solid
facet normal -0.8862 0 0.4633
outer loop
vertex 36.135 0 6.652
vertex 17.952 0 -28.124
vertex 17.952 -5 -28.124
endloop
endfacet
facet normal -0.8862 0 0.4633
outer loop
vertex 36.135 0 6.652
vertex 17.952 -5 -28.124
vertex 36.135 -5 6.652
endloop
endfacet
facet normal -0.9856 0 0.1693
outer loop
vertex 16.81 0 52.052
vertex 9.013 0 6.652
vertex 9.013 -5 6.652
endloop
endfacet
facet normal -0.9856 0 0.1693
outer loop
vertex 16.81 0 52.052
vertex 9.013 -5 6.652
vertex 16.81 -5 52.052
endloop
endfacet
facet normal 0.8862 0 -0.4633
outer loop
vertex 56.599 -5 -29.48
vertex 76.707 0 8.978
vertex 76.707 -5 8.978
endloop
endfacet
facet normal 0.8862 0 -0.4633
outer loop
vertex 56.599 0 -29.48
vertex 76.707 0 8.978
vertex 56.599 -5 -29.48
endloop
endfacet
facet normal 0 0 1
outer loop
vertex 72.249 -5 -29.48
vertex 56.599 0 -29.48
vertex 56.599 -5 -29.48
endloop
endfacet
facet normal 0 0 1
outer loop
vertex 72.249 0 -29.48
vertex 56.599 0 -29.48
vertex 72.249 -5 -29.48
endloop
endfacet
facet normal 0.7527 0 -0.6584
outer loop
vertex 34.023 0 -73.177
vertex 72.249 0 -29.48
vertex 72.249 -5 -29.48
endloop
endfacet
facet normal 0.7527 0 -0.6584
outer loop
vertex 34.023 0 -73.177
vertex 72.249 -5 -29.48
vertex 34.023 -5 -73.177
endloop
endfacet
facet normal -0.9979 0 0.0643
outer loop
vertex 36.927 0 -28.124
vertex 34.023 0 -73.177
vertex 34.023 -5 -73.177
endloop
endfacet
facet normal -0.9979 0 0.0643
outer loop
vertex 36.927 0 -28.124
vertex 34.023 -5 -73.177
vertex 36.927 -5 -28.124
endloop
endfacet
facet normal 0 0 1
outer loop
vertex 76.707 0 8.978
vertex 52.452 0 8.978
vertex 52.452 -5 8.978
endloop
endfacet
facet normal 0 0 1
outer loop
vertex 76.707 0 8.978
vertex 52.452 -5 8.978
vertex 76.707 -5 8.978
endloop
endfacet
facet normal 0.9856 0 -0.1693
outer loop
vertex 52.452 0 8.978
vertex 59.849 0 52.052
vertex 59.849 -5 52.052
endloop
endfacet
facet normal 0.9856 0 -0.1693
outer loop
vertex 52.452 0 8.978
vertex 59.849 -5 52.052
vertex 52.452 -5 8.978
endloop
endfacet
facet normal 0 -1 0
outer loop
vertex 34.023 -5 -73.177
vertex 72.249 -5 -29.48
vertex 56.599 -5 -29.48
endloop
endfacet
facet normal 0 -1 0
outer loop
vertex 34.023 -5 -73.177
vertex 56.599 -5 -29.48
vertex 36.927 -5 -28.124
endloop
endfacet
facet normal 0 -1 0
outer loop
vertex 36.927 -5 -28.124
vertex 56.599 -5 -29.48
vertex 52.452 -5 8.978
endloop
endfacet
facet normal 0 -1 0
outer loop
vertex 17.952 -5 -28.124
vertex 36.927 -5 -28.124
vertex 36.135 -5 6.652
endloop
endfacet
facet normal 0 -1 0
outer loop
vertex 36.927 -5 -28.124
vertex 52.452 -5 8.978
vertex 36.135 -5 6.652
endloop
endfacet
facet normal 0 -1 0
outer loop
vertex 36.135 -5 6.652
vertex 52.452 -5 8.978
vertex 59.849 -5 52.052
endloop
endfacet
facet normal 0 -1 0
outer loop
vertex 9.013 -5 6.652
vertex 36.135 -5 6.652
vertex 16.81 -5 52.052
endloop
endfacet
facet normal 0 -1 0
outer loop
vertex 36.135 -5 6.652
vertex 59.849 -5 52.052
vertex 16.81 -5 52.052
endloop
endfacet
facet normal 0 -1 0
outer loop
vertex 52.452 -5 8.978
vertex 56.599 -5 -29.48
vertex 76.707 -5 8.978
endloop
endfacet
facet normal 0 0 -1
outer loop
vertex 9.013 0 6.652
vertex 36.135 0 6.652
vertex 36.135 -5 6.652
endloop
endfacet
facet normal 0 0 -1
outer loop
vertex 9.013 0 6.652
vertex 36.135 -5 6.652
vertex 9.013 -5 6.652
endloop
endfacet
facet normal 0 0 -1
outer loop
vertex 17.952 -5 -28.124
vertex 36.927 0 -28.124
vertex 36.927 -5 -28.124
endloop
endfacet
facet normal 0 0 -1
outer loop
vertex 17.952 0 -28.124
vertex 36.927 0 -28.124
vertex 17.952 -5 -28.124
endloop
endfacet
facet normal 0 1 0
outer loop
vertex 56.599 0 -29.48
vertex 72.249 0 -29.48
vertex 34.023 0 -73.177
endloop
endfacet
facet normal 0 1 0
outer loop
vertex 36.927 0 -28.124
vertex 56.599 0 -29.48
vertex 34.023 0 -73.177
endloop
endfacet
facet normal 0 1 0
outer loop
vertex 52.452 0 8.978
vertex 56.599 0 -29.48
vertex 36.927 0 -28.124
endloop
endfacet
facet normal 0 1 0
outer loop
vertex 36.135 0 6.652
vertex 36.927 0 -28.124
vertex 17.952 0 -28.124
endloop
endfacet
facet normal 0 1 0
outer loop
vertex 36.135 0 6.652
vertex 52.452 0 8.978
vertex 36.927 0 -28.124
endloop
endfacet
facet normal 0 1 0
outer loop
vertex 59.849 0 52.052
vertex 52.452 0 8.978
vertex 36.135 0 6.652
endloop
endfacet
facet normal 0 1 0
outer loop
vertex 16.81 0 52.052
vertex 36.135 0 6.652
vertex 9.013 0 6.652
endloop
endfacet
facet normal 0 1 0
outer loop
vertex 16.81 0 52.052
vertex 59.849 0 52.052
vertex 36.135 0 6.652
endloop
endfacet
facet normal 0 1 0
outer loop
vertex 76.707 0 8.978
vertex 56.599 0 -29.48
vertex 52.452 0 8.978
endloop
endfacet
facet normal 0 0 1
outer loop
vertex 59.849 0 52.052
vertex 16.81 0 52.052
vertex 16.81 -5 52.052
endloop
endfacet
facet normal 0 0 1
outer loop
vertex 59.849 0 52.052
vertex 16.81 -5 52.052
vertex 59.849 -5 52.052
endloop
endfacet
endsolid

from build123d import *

# Parameters (mm, degrees)
PAD_DEPTH = 5


with BuildPart() as part:
    # Sketch → Pad (new body)
    with BuildSketch(Plane.XZ):
        Polygon((16.809578, 52.051549), (59.849419, 52.051549), (52.451943, 8.978119), (76.707435, 8.978119), (56.599094, -29.48042), (72.248703, -29.48042), (34.023357, -73.176758), (36.926517, -28.123772), (17.951936, -28.123772), (36.134954, 6.652457), (9.012691, 6.652457), align=None)
    extrude(amount=PAD_DEPTH)


solid = part.part
